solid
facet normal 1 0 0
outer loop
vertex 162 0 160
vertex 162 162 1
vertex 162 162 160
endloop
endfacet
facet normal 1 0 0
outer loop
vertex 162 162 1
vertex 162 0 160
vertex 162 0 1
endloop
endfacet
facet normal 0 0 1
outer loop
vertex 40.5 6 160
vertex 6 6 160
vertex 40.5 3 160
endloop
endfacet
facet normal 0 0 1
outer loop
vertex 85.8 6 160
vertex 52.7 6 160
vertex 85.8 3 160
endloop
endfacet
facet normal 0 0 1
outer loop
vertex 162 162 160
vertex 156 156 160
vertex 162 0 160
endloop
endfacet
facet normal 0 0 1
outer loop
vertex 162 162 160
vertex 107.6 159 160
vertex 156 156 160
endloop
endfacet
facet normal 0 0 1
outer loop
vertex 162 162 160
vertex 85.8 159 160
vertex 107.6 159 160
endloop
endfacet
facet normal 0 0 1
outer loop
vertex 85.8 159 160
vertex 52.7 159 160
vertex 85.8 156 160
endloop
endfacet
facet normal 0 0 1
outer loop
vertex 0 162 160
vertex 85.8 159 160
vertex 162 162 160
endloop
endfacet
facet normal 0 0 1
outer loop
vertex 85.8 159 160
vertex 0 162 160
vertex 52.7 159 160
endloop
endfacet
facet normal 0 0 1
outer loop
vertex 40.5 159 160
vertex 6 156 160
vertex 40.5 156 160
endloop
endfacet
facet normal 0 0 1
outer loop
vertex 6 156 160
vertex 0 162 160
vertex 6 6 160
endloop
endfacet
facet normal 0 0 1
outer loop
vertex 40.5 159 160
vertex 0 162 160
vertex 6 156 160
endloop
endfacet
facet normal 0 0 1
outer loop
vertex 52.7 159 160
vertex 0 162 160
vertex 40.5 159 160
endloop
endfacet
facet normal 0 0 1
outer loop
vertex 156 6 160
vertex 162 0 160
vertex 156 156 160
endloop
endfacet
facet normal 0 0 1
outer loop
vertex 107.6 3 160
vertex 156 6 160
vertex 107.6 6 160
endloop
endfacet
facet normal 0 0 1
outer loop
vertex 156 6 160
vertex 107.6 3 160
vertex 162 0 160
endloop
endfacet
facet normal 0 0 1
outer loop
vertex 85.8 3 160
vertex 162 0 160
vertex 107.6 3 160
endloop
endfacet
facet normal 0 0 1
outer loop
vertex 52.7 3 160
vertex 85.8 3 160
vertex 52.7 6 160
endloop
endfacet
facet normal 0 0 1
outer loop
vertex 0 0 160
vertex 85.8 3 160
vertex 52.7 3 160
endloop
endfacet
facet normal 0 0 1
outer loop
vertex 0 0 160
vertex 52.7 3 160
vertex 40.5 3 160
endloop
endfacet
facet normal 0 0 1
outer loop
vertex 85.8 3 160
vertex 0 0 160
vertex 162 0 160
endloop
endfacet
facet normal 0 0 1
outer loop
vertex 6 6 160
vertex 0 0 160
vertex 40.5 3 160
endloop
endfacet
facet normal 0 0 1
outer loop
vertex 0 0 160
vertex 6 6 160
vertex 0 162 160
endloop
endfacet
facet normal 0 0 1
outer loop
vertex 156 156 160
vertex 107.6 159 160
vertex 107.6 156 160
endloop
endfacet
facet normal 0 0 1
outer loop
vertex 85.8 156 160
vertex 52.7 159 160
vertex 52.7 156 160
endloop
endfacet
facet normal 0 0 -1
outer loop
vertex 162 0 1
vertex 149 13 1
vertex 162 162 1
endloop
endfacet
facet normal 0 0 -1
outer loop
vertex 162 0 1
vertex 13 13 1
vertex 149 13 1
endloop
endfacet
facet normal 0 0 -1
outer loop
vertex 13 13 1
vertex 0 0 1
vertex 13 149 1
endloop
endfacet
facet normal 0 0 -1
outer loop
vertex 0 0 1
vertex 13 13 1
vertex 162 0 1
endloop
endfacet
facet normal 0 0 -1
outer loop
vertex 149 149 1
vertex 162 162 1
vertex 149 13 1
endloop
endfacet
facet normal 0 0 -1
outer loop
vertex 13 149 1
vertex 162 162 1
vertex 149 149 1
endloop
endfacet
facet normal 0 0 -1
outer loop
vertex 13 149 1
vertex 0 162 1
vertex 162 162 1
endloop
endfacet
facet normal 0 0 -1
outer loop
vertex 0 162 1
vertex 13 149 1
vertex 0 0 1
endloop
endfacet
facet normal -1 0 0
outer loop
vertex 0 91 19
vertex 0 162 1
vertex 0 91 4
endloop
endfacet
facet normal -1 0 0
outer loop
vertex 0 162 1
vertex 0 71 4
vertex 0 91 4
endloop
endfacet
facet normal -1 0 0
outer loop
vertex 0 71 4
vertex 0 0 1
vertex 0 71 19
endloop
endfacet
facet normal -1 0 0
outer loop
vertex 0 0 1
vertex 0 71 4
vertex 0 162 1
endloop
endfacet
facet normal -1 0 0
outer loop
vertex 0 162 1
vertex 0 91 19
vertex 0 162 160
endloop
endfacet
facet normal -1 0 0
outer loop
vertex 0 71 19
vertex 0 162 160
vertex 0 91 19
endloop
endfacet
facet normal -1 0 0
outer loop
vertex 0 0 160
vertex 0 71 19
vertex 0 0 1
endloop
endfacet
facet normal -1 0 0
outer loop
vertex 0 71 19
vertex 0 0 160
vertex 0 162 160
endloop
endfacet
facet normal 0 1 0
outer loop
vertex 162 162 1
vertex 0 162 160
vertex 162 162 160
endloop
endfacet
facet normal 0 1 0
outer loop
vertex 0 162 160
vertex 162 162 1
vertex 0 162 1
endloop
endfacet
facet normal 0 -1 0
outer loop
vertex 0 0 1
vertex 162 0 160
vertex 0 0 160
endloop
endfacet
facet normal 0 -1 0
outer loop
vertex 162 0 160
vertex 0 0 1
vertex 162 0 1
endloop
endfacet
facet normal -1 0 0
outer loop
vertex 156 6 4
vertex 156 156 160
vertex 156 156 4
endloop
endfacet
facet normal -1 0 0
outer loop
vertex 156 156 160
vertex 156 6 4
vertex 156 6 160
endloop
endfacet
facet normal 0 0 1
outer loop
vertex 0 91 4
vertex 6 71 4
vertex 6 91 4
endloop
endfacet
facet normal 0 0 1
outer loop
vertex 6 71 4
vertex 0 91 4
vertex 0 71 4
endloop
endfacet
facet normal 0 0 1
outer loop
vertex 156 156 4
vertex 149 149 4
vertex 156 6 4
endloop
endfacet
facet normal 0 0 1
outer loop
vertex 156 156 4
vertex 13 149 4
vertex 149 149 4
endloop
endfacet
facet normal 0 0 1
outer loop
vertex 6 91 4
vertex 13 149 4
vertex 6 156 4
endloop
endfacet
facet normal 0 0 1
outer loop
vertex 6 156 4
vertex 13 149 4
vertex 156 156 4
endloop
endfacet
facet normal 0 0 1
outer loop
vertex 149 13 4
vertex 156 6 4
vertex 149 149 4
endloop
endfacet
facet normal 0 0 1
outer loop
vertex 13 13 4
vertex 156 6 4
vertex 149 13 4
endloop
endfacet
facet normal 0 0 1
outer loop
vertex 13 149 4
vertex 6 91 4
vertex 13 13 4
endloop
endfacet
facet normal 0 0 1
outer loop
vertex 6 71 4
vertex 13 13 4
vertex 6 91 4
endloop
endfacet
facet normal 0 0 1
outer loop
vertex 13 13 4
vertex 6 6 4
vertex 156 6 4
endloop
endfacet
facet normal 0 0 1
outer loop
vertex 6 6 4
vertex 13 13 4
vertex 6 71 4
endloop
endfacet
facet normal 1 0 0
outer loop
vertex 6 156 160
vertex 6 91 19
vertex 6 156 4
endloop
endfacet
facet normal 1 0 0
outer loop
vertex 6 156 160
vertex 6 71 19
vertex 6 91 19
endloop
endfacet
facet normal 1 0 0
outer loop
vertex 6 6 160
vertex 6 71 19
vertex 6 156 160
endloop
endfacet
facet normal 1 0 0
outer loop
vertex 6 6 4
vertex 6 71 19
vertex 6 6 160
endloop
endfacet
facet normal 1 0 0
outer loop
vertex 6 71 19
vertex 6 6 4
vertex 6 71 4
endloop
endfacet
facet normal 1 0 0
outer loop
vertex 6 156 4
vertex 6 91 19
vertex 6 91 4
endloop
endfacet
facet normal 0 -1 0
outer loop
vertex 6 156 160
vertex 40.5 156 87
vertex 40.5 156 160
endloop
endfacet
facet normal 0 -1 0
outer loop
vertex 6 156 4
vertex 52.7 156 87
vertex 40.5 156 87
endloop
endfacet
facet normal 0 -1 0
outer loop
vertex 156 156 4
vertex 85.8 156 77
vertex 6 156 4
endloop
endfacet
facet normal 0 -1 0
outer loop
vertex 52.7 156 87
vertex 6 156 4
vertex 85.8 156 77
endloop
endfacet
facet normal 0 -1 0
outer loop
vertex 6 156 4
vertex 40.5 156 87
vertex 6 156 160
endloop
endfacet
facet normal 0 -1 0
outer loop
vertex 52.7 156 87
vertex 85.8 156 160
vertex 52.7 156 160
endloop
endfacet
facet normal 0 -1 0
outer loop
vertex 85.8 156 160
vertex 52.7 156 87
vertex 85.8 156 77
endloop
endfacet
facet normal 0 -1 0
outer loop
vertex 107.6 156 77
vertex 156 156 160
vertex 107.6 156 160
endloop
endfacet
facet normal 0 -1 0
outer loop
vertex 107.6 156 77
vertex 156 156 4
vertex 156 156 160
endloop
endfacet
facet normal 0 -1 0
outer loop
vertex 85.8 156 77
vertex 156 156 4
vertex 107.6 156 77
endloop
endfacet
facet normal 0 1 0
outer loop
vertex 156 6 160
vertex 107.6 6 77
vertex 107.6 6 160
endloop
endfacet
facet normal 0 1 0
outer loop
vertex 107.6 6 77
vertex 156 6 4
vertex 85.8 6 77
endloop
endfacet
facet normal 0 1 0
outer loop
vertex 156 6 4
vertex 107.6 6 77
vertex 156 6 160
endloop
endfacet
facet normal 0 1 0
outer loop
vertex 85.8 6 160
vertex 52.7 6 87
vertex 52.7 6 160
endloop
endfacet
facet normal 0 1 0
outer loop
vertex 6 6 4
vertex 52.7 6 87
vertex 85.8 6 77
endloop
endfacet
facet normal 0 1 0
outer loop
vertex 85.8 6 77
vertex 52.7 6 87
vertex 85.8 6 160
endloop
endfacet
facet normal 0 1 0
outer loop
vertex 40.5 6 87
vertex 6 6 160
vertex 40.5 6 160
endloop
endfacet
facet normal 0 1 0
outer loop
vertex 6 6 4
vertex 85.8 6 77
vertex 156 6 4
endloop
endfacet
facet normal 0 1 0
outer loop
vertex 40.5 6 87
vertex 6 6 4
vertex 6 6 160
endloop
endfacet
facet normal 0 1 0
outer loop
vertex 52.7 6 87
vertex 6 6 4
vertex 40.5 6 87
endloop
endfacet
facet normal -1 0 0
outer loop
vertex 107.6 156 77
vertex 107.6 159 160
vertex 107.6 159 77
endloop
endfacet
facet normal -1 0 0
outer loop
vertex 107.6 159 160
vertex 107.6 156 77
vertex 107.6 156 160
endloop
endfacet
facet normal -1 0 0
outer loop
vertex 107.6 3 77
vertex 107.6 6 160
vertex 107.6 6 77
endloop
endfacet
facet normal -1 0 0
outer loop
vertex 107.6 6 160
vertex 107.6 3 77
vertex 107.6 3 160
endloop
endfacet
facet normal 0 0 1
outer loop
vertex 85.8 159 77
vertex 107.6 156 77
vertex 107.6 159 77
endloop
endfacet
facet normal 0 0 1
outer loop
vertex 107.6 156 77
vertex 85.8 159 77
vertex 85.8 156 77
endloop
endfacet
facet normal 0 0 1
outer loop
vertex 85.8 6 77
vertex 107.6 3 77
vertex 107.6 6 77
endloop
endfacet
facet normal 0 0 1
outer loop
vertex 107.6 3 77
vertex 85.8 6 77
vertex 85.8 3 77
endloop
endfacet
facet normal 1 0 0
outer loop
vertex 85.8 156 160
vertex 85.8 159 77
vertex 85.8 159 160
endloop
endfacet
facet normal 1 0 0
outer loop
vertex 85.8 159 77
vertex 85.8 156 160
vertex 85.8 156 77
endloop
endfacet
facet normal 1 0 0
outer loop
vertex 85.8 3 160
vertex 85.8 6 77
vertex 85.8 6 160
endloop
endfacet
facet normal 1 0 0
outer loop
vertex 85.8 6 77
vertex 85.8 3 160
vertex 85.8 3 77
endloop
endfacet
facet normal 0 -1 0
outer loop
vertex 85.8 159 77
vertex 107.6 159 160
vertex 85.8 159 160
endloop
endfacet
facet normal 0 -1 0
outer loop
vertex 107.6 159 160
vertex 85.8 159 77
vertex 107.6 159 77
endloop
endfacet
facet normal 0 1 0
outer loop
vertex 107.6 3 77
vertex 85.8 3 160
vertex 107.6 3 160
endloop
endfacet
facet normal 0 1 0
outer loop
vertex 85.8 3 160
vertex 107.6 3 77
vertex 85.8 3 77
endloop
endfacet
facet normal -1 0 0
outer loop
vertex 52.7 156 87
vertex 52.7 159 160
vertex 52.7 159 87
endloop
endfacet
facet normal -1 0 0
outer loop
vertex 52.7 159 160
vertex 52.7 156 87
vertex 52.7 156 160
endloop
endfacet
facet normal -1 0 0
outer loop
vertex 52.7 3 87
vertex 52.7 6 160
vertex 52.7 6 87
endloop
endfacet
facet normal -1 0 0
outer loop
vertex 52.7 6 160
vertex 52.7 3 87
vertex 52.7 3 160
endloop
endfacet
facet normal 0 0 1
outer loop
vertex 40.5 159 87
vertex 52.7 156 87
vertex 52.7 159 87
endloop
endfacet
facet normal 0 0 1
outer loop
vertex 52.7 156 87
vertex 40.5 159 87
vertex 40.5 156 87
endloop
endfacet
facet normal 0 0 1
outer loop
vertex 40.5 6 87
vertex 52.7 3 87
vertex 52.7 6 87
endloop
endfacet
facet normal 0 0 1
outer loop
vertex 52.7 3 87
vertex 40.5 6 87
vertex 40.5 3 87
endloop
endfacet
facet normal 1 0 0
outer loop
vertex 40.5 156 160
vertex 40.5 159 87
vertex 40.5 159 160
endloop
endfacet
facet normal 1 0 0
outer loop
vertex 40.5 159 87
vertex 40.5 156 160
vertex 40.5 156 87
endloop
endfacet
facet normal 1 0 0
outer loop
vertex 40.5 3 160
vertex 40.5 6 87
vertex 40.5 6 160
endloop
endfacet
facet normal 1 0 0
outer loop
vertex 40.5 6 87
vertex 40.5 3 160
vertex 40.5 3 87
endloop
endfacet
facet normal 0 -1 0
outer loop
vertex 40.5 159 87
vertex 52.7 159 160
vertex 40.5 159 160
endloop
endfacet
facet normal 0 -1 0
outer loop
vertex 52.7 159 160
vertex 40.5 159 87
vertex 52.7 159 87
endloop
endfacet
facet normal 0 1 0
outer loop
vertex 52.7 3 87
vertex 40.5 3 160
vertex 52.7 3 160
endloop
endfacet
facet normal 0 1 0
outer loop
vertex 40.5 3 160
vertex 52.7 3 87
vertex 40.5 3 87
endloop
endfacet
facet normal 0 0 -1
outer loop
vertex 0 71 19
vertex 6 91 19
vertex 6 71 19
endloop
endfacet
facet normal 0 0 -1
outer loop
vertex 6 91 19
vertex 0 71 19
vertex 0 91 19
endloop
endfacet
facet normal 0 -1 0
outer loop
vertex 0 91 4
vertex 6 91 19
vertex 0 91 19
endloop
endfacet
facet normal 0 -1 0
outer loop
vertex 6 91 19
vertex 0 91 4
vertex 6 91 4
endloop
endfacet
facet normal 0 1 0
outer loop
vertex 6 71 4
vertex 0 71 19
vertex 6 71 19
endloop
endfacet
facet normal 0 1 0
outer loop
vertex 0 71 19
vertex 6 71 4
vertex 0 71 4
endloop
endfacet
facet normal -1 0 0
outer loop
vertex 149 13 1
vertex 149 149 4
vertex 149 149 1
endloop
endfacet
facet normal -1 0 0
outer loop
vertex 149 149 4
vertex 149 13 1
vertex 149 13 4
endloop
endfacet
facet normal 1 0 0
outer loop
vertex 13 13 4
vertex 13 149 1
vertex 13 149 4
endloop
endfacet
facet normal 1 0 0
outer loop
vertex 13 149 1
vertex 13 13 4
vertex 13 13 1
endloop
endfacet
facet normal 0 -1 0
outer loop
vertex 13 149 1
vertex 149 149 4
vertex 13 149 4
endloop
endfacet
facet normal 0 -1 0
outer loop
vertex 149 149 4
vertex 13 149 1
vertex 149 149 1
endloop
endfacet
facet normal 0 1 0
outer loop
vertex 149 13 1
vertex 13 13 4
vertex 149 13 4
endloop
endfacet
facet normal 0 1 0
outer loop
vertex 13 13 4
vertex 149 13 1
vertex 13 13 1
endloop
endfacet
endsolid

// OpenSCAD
wall = 3;
height = 80;
thick = 3;
totalThick = 6;
boxInternalLen = 150;
platformWdh = 10;
platformLen = 50;
nfcReaderSupporterInternalWidth = 15.6;
nfcReaderLen = 122;
nfcReaderWdhHalf = 37;

hole = 136;
slotHeight = 4;

translate([0, 0, 1])
difference(){
    cube([
        boxInternalLen + 2 * totalThick, 
        boxInternalLen + 2 * totalThick, 
        boxInternalLen + 2 * totalThick - thick
    ], false);
    
    translate([totalThick, totalThick, 3])
    cube([
        boxInternalLen,
        boxInternalLen,
        boxInternalLen + totalThick + thick
    ], false);
    
    translate([
        (boxInternalLen + 2 * totalThick) / 2 + platformWdh / 2 - 0.2, 
        thick, 
        boxInternalLen + 2 * totalThick - thick - (height + wall)
    ])
    cube([
        nfcReaderSupporterInternalWidth + 2 * wall + 0.2,
        boxInternalLen + 2 * thick,
        height + wall
    ], false);
    
    translate([
        (boxInternalLen + 2 * totalThick) / 2 - 45.5 + platformWdh / 2, 
        thick, 
        boxInternalLen + 2 * totalThick - thick - (height + wall) + 10
    ])
    cube([
        12.2,
        boxInternalLen + 2 * thick,
        height + wall - 10
    ], false);
    
    translate([0, (boxInternalLen + 2 * totalThick - 20) / 2, 3])
    cube([totalThick, 20, 15], false);
    
    translate([
        (boxInternalLen + 2 * totalThick - hole) / 2, 
        (boxInternalLen + 2 * totalThick - hole) / 2, 
        0
    ])
    cube([hole, hole, 3], false);
}
